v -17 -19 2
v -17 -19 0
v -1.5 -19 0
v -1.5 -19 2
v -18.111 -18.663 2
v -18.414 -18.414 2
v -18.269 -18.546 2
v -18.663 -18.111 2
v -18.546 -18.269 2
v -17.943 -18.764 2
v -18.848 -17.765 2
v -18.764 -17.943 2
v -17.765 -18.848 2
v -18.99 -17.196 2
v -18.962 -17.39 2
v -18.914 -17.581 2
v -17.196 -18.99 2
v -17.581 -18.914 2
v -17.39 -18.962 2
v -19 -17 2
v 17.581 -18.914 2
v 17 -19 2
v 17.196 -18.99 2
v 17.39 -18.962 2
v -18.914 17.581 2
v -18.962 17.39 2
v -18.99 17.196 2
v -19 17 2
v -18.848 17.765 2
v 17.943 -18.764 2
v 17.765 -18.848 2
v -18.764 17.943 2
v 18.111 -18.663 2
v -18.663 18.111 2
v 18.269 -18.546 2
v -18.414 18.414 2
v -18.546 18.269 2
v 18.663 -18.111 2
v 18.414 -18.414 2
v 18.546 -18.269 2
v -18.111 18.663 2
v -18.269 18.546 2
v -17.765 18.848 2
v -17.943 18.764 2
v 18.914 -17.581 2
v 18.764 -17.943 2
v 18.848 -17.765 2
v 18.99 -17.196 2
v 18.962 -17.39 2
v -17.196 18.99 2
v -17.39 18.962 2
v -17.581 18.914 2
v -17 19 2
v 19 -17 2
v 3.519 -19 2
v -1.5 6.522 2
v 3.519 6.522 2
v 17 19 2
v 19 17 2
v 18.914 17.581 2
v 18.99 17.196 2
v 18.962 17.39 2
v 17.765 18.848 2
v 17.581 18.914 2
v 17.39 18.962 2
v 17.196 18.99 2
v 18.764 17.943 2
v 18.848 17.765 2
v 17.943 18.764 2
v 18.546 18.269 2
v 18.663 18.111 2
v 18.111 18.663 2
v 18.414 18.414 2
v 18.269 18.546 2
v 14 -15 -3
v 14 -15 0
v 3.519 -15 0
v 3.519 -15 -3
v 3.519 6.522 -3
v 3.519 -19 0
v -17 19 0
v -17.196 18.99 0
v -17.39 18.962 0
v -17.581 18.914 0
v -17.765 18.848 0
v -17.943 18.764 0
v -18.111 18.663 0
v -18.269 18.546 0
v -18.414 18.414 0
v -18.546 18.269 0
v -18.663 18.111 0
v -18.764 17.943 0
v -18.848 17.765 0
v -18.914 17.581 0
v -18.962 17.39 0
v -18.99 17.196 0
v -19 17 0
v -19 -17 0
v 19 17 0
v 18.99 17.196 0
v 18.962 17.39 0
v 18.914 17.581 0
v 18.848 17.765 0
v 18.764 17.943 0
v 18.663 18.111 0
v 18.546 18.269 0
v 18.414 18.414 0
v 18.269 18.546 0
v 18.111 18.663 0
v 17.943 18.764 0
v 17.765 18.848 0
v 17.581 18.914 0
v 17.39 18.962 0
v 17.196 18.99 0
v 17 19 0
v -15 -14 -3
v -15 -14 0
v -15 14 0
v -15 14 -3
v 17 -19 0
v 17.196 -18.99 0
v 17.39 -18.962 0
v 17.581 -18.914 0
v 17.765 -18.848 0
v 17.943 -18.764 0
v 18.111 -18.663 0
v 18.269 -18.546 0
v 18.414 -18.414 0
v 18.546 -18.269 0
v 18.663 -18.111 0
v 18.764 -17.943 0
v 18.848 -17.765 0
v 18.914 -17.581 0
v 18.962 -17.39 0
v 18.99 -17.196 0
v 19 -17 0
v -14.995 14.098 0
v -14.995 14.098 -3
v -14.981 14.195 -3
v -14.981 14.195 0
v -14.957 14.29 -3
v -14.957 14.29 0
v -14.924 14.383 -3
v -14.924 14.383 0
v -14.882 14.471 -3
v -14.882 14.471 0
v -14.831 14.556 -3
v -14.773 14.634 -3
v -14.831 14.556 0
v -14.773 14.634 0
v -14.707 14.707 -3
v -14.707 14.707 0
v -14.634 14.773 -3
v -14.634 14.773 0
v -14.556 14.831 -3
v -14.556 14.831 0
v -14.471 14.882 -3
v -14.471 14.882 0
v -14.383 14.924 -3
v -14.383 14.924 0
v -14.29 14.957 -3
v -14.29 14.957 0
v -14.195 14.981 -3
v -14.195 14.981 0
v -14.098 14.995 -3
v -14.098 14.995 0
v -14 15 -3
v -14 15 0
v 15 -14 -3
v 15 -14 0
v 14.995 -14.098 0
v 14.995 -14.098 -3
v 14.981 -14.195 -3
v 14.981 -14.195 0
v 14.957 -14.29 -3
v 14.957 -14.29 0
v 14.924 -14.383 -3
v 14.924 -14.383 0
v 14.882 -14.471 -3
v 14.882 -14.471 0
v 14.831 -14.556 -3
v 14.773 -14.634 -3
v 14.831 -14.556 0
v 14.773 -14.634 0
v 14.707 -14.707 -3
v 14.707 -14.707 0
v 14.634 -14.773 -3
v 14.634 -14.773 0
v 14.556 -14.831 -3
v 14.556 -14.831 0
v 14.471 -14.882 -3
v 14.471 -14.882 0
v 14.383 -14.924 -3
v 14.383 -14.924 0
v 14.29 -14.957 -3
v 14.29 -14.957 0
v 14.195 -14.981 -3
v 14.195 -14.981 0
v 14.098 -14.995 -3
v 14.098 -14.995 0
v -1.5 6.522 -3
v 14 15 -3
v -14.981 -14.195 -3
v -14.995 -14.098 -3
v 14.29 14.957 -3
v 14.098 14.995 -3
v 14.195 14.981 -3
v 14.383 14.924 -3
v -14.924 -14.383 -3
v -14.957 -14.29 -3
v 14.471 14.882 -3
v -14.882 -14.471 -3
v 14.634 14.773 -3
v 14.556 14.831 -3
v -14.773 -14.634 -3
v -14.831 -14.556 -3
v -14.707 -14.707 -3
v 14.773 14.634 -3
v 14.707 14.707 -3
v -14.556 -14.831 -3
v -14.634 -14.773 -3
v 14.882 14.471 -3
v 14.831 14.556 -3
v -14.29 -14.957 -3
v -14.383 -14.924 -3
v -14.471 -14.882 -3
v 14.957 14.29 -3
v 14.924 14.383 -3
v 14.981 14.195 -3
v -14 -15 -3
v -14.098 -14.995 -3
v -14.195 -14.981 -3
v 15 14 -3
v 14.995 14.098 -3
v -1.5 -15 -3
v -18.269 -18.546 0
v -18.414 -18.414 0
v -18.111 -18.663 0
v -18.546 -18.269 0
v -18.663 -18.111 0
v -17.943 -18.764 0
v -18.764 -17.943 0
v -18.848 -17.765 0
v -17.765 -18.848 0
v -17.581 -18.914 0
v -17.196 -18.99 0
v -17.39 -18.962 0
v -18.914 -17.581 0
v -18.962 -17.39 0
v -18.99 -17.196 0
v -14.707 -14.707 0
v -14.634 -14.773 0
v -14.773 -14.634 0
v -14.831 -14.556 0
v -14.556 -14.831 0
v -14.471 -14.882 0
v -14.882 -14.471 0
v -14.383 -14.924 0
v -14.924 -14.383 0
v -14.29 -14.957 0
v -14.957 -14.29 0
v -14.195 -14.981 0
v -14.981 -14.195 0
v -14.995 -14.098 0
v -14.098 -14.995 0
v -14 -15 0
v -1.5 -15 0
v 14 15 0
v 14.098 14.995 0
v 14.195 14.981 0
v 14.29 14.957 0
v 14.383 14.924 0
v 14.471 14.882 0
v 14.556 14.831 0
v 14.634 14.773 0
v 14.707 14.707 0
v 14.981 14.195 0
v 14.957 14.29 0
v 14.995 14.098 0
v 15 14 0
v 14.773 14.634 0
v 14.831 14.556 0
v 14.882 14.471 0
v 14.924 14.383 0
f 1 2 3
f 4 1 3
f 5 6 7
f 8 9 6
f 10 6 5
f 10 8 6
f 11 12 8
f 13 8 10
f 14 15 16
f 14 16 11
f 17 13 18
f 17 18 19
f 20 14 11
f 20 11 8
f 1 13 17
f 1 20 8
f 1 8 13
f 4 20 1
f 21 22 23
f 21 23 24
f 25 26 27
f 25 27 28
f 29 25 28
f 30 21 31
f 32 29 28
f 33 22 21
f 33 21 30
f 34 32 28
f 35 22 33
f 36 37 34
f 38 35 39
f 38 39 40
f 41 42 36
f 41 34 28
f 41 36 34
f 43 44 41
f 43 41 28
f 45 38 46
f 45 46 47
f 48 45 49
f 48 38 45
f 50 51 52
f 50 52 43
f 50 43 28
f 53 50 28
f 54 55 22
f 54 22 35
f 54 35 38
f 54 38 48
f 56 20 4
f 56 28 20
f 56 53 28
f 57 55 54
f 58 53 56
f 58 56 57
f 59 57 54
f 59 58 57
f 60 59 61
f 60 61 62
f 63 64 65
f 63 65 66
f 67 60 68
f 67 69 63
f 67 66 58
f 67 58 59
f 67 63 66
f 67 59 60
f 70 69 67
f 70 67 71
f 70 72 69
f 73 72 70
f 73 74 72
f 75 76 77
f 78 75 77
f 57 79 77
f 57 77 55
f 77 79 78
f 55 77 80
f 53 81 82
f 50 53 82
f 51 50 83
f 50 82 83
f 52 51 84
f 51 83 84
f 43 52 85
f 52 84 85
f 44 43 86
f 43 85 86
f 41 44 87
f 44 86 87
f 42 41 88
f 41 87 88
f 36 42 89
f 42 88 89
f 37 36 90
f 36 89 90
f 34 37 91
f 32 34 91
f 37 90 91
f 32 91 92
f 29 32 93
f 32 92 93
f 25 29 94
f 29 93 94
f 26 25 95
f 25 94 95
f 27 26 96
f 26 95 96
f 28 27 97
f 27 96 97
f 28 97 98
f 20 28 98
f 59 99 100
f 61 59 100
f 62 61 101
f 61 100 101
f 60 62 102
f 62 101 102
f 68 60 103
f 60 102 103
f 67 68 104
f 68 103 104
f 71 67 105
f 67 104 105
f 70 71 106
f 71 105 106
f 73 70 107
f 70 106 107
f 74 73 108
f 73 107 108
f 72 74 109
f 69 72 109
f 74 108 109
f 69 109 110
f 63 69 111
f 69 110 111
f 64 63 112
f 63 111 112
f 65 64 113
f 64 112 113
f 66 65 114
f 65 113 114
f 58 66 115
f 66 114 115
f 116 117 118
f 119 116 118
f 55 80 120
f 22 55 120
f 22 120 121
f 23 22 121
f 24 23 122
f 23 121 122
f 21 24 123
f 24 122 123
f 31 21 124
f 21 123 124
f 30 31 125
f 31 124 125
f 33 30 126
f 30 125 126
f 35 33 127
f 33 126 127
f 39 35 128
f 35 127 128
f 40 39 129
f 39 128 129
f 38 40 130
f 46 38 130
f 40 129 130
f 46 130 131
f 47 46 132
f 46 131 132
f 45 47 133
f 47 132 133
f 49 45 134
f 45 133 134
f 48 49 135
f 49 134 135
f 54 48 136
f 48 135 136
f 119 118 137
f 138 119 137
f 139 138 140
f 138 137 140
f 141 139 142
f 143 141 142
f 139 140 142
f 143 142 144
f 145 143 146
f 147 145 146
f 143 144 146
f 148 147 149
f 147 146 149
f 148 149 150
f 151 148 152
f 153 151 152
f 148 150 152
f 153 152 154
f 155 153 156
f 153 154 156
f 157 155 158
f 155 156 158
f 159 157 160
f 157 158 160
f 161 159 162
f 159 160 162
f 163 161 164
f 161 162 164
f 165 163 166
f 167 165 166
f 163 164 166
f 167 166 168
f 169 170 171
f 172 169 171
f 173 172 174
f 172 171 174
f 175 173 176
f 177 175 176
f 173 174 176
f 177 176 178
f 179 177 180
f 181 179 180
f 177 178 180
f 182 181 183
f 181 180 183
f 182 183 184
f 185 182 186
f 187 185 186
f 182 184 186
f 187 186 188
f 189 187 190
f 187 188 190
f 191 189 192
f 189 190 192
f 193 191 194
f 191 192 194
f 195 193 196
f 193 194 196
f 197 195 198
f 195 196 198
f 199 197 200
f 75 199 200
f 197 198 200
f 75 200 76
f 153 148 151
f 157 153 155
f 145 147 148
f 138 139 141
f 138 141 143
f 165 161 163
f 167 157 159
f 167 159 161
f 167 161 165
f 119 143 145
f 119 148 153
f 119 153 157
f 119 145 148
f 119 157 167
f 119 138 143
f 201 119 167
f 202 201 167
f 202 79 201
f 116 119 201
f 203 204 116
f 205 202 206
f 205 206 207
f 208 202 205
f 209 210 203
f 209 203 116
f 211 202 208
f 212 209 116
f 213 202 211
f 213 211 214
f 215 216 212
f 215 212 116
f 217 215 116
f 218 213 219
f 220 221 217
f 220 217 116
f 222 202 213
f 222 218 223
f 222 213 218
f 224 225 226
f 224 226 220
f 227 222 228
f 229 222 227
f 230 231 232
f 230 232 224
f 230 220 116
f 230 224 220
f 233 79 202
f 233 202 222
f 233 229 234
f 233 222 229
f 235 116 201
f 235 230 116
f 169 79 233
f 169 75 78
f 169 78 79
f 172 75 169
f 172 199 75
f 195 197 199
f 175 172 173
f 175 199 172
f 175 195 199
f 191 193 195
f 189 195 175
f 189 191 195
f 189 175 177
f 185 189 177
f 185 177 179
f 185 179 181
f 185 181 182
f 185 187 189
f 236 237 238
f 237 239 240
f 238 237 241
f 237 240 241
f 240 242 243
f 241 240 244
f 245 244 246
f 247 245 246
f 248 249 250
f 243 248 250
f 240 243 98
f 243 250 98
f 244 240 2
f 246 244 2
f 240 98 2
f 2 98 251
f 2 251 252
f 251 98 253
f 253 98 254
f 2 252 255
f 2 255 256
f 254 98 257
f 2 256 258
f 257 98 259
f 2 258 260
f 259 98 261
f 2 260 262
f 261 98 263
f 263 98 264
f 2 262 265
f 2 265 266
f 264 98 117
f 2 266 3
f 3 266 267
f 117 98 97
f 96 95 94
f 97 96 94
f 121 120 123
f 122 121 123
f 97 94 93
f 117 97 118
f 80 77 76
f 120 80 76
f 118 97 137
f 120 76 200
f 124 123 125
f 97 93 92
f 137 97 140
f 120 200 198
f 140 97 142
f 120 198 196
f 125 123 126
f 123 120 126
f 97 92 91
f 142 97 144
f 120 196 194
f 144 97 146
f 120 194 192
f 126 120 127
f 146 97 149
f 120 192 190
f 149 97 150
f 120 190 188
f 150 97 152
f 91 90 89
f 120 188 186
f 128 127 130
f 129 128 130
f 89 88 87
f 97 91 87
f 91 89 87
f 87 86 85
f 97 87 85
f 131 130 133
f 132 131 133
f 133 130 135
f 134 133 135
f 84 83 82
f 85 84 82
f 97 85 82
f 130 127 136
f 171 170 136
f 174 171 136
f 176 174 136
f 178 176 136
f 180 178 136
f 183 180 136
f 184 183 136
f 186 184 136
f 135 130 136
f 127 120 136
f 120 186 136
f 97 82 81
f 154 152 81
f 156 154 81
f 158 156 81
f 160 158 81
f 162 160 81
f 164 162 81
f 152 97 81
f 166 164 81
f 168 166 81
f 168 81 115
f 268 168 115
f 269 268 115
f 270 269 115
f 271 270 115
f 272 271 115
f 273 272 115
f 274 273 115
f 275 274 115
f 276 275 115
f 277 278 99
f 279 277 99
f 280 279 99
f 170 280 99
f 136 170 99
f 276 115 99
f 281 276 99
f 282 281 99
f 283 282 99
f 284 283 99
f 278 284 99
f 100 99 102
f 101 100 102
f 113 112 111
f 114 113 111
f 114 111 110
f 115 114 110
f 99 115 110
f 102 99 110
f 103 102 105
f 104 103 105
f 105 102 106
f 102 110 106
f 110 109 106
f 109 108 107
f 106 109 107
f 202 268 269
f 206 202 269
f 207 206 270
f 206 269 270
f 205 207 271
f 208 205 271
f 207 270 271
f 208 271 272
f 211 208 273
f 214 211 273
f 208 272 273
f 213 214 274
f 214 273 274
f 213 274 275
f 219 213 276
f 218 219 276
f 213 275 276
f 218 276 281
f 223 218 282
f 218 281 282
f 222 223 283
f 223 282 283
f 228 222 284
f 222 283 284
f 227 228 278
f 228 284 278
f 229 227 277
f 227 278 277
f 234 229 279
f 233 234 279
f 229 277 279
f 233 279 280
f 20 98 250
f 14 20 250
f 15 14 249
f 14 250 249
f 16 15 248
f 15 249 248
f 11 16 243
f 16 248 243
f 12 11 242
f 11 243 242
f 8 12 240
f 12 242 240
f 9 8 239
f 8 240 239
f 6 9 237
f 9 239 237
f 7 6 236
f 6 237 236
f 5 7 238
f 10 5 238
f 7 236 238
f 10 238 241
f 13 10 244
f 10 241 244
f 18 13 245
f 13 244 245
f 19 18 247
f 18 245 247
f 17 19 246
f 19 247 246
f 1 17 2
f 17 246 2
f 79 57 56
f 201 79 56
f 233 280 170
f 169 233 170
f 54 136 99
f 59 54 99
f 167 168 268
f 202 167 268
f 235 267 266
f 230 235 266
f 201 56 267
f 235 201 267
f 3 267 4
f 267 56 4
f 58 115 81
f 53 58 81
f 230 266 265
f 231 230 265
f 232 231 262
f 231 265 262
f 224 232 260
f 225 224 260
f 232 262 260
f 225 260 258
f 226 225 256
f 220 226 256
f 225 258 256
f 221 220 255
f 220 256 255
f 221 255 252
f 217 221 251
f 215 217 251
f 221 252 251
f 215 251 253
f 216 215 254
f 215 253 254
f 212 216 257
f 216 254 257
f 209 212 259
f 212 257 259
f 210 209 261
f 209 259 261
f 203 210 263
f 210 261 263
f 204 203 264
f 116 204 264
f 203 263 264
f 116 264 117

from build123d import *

# Parameters (mm, degrees)
F1_DEPTH = 2
F3_DEPTH = 3


with BuildPart() as f1:
    # F0 (on Top) → F1 (new body)
    with BuildSketch(Plane.XY):
        with BuildLine():
            Line((17, 19), (-17, 19))
            ThreePointArc((-17, 19), (-18.414214, 18.414214), (-19, 17))
            Line((-19, 17), (-19, -17))
            ThreePointArc((-19, -17), (-18.414214, -18.414214), (-17, -19))
            Line((-17, -19), (-1.5, -19))
            Line((-1.5, -19), (-1.5, 6.522064))
            Line((-1.5, 6.522064), (1.5, 6.522064))
            Line((1.5, 6.522064), (1.519474, 6.522064))
            Line((1.519474, 6.522064), (3.519474, 6.522064))
            Line((3.519474, 6.522064), (3.519474, -19))
            Line((3.519474, -19), (17, -19))
            ThreePointArc((17, -19), (18.414214, -18.414214), (19, -17))
            Line((19, -17), (19, 17))
            ThreePointArc((19, 17), (18.414214, 18.414214), (17, 19))
        make_face()
    extrude(amount=F1_DEPTH)

    # F2 (on face) → F3 (join)
    with BuildSketch(Plane(origin=(0, 0, 0), x_dir=(1, 0, 0), z_dir=(0, 0, -1))):
        with BuildLine():
            Line((-1.5, 15), (-14, 15))
            ThreePointArc((-14, 15), (-14.707107, 14.707107), (-15, 14))
            Line((-15, 14), (-15, -14))
            ThreePointArc((-15, -14), (-14.707107, -14.707107), (-14, -15))
            Line((-14, -15), (14, -15))
            ThreePointArc((14, -15), (14.707107, -14.707107), (15, -14))
            Line((15, -14), (15, 14))
            ThreePointArc((15, 14), (14.707107, 14.707107), (14, 15))
            Line((14, 15), (3.519474, 15))
            Line((3.519474, 15), (3.519474, -6.522064))
            Line((3.519474, -6.522064), (-1.5, -6.522064))
            Line((-1.5, -6.522064), (-1.5, 15))
        make_face()
    extrude(amount=F3_DEPTH)


solid = f1.part
